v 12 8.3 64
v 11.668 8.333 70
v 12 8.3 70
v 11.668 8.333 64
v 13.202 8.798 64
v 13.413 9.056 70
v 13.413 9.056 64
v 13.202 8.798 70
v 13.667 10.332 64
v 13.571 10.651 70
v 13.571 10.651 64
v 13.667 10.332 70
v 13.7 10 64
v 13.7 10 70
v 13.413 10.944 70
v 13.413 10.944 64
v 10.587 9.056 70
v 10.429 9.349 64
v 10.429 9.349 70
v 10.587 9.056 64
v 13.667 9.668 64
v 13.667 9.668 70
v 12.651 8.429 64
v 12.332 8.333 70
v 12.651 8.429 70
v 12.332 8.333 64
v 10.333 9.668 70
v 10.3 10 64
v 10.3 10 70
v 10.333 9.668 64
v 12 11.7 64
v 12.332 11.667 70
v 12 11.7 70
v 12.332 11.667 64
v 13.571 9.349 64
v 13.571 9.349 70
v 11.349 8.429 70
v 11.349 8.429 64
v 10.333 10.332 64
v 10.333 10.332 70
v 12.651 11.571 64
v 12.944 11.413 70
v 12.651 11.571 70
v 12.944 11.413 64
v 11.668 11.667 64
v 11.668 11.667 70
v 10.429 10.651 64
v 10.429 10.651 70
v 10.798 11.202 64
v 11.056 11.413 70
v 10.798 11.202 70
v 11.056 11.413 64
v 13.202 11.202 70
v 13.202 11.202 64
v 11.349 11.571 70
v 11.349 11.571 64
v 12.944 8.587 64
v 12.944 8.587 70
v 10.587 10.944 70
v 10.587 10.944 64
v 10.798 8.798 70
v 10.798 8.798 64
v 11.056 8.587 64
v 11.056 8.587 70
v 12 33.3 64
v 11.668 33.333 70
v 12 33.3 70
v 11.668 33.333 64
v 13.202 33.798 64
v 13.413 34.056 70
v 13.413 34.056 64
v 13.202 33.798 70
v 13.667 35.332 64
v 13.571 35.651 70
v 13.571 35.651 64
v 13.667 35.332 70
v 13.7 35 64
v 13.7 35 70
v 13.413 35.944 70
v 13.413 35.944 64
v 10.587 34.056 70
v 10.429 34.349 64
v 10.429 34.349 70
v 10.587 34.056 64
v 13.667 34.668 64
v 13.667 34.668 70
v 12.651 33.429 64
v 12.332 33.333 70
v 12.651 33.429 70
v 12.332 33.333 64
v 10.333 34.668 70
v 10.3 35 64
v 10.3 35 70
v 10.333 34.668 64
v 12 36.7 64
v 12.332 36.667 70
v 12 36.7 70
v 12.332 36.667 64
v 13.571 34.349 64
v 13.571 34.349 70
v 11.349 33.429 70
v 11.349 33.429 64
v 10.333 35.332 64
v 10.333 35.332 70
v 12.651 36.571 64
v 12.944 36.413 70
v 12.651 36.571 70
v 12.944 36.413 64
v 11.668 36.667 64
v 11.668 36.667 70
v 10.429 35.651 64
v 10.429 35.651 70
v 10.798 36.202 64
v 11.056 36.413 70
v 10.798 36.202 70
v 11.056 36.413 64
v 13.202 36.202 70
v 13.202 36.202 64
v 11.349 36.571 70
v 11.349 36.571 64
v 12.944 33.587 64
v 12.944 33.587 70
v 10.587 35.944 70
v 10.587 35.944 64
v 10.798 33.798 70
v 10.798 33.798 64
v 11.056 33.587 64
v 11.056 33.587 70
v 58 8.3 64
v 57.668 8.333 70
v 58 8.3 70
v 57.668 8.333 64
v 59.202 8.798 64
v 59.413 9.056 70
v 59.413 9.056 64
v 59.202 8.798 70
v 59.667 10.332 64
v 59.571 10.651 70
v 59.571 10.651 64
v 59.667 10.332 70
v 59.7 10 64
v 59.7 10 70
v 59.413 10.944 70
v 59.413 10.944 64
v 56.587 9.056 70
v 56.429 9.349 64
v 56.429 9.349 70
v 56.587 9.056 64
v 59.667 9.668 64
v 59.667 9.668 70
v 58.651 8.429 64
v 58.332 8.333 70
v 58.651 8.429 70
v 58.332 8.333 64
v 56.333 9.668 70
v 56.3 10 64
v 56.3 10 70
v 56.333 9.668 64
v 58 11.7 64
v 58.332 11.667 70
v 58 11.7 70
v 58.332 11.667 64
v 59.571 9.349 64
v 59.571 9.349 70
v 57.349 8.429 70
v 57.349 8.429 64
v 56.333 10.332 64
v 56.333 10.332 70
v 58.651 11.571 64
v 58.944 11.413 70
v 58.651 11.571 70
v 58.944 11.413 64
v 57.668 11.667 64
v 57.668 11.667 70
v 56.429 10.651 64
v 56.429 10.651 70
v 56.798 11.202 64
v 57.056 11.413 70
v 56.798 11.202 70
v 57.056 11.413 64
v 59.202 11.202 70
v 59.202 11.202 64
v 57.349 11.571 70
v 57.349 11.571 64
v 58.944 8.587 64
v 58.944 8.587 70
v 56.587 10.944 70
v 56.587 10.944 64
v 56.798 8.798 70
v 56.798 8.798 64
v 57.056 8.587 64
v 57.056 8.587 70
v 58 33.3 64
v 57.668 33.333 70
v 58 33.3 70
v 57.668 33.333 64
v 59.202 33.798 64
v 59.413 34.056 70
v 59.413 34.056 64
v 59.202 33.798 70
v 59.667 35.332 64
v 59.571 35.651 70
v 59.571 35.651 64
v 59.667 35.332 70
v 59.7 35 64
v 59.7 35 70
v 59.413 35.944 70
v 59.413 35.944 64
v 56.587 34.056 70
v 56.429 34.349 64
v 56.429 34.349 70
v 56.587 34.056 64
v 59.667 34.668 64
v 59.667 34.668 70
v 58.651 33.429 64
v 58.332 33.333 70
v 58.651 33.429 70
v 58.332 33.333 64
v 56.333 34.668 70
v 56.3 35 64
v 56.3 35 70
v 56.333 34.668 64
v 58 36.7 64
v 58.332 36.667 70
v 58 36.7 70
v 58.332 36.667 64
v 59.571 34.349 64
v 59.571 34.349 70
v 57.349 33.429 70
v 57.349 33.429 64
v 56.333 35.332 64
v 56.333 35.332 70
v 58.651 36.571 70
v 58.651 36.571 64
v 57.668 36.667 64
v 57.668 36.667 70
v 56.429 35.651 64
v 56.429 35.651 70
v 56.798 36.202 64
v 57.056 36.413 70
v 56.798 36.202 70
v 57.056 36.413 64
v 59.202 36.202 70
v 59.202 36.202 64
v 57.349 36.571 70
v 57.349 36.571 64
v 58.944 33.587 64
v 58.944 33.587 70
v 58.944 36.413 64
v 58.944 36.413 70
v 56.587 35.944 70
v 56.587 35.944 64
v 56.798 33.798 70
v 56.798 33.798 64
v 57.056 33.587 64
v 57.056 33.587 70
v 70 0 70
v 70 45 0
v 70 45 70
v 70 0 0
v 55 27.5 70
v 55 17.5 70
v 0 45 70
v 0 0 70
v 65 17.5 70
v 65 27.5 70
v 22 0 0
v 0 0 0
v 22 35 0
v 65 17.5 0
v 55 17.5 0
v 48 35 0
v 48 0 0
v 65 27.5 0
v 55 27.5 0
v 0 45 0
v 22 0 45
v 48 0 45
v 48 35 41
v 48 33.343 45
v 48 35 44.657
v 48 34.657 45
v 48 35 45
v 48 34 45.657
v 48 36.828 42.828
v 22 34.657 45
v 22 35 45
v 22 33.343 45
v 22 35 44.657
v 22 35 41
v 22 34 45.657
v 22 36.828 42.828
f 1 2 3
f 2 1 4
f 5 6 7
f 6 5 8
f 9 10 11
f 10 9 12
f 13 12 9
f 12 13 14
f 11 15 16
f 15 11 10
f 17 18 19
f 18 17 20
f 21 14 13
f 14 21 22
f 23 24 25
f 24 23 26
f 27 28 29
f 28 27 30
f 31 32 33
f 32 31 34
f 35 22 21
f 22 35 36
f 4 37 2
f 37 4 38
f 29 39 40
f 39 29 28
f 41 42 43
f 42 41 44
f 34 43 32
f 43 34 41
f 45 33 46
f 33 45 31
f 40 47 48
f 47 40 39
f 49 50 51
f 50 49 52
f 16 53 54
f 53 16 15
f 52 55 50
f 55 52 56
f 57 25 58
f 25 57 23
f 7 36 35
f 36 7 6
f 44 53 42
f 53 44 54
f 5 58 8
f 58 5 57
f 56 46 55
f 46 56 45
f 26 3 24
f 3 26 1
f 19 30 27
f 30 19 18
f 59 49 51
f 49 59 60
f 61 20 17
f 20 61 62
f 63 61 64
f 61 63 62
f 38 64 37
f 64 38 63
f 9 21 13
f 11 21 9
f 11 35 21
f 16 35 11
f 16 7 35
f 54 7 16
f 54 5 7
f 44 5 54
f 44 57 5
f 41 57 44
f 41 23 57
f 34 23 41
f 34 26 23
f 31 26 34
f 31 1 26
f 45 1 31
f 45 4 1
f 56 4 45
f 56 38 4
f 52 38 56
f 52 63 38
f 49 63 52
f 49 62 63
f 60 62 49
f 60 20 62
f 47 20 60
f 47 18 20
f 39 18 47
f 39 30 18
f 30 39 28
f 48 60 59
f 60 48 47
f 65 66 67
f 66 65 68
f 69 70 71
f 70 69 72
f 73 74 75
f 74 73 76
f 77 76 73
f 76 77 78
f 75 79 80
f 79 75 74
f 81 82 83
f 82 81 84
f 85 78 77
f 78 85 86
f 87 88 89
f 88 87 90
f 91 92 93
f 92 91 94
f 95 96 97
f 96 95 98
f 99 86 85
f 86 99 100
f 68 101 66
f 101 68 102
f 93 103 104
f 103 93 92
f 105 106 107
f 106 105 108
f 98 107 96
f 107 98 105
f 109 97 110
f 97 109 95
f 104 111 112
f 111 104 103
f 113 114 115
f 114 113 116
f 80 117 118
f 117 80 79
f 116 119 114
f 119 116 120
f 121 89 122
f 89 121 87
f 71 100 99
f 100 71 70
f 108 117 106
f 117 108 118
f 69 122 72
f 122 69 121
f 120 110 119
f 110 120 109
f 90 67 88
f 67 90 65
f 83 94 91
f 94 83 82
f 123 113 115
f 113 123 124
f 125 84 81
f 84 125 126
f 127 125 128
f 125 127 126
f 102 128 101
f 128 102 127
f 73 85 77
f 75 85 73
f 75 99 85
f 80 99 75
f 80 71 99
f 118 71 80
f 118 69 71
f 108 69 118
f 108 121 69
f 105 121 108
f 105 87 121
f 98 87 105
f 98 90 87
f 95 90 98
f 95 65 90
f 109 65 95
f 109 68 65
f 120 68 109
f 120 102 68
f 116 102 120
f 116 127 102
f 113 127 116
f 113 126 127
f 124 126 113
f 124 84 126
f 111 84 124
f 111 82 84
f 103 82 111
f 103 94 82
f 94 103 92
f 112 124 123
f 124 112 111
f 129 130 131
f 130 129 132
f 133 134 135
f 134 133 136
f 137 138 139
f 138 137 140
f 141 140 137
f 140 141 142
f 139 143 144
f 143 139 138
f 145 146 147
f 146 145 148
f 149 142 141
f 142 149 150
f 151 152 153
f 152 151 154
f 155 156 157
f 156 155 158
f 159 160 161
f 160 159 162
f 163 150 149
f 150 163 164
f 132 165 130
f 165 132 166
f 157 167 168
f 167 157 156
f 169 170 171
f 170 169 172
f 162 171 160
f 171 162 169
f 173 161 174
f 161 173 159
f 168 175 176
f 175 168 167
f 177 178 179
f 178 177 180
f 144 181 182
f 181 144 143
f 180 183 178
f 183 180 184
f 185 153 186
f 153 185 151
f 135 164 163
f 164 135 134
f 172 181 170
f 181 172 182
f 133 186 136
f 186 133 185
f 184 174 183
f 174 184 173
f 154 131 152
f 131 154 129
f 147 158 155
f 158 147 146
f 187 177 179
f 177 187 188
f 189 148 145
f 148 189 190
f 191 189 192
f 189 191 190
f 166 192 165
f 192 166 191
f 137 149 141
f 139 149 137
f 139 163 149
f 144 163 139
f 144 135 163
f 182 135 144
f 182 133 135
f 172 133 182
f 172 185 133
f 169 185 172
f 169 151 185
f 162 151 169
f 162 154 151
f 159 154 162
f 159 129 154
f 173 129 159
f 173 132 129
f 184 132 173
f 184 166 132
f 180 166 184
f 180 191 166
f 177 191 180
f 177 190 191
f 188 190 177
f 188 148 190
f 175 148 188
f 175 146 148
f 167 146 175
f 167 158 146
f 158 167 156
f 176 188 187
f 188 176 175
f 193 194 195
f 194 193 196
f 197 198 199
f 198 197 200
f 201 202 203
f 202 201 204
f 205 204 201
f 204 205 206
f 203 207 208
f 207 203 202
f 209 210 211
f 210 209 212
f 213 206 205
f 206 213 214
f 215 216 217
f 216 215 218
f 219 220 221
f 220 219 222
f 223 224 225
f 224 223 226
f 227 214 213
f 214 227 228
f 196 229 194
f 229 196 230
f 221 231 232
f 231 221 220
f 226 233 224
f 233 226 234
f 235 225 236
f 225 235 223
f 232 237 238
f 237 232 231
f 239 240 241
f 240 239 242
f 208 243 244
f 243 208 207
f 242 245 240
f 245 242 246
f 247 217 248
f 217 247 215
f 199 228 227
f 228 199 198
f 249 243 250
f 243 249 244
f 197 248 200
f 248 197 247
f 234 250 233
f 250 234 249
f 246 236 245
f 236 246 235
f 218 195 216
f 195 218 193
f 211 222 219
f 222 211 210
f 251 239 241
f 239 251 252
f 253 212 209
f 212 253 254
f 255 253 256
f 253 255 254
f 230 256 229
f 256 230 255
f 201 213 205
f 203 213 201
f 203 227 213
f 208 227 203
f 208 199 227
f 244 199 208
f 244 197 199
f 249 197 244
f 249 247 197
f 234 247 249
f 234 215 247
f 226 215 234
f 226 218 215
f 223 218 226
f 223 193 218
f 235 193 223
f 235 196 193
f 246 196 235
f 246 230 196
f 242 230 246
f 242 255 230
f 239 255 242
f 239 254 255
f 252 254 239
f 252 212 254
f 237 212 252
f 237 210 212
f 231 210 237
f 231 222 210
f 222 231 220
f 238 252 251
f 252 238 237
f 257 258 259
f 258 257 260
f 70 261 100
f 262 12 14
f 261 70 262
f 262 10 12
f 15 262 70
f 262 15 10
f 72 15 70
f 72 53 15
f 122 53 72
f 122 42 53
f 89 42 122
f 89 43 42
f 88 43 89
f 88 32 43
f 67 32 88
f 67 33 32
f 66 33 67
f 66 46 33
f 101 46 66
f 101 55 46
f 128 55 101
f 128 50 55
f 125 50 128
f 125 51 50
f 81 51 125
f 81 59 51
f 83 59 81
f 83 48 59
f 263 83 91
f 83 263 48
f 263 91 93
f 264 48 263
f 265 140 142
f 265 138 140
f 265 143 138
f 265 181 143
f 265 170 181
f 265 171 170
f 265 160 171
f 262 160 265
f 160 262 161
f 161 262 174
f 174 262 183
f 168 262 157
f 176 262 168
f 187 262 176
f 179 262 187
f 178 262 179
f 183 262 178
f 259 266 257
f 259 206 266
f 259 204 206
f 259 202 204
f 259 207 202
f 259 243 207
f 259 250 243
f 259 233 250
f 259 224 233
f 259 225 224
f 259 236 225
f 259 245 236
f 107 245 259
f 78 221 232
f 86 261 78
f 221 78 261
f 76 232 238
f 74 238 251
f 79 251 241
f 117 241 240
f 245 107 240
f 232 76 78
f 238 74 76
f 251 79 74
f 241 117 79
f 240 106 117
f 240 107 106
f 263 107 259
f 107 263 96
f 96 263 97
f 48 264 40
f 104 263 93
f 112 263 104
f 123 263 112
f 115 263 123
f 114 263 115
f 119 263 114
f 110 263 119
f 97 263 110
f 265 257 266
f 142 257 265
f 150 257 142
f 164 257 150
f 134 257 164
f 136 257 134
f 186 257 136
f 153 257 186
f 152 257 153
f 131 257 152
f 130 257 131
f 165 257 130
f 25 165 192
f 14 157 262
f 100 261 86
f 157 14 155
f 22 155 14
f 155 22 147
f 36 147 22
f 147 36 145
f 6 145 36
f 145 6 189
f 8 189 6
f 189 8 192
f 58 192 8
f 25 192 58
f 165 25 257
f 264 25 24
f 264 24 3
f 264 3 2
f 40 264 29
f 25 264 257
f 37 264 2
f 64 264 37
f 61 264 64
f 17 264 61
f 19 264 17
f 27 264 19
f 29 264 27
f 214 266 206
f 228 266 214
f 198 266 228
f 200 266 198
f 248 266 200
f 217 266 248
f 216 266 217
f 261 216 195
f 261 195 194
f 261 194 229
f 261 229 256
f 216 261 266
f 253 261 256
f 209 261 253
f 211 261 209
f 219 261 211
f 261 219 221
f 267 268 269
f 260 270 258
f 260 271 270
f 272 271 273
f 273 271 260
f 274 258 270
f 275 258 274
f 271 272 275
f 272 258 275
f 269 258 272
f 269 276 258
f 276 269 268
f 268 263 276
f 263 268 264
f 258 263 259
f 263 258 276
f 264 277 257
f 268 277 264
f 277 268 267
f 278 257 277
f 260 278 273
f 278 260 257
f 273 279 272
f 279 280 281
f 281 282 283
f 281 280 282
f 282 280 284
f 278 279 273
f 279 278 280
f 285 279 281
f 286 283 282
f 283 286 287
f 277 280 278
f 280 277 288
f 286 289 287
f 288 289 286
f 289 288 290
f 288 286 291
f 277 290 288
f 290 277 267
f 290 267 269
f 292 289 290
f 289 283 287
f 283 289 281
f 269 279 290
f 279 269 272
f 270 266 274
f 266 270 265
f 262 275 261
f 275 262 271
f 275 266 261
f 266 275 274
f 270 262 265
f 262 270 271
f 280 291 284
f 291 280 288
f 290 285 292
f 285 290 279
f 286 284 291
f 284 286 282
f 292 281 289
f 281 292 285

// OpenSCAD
// ============================================================
// PINCE DE FIXATION - Système de détection maladies plantes
// Dimensions: 70mm(L) × 45mm(l) × 70mm(H)
// Slot C: rebord jardinière 25mm + 1mm jeu = 26mm
// ============================================================

$fn = 32;

// Paramètres
W = 70;      // Largeur totale
D = 45;      // Profondeur totale
H = 70;      // Hauteur totale
WT = 5;      // Épaisseur paroi min

SLOT_W = 26; // Largeur slot (rebord 25mm + 1mm jeu)
SLOT_D = 35; // Profondeur slot
SLOT_H = 45; // Hauteur ouverture slot (depuis bas)

CABLE_W = 10; // Canal câbles
SCREW_D = 3.4; // Diam trou vis M3

module pince() {
    difference() {
        // Corps principal
        cube([W, D, H]);

        // Slot C (ouvert vers le bas) - centré en largeur
        translate([(W - SLOT_W) / 2, -1, 0])
            cube([SLOT_W, SLOT_D + 1, SLOT_H]);

        // Canal passage câbles vertical (10×10mm) côté droit
        translate([W - WT - CABLE_W, D/2 - CABLE_W/2, -1])
            cube([CABLE_W, CABLE_W, H + 2]);

        // 4 trous de vis M3 (diam 3.4mm) sur plateau supérieur
        for (pos = [[12, 10], [12, D-10], [W-12, 10], [W-12, D-10]]) {
            translate([pos[0], pos[1], H - WT - 1])
                cylinder(d = SCREW_D, h = WT + 2);
        }

        // Chanfreins internes du slot pour faciliter le clipsage
        translate([(W - SLOT_W) / 2, SLOT_D - 1, SLOT_H - 5])
            rotate([45, 0, 0])
                cube([SLOT_W, 4, 4]);
    }
}

pince();
